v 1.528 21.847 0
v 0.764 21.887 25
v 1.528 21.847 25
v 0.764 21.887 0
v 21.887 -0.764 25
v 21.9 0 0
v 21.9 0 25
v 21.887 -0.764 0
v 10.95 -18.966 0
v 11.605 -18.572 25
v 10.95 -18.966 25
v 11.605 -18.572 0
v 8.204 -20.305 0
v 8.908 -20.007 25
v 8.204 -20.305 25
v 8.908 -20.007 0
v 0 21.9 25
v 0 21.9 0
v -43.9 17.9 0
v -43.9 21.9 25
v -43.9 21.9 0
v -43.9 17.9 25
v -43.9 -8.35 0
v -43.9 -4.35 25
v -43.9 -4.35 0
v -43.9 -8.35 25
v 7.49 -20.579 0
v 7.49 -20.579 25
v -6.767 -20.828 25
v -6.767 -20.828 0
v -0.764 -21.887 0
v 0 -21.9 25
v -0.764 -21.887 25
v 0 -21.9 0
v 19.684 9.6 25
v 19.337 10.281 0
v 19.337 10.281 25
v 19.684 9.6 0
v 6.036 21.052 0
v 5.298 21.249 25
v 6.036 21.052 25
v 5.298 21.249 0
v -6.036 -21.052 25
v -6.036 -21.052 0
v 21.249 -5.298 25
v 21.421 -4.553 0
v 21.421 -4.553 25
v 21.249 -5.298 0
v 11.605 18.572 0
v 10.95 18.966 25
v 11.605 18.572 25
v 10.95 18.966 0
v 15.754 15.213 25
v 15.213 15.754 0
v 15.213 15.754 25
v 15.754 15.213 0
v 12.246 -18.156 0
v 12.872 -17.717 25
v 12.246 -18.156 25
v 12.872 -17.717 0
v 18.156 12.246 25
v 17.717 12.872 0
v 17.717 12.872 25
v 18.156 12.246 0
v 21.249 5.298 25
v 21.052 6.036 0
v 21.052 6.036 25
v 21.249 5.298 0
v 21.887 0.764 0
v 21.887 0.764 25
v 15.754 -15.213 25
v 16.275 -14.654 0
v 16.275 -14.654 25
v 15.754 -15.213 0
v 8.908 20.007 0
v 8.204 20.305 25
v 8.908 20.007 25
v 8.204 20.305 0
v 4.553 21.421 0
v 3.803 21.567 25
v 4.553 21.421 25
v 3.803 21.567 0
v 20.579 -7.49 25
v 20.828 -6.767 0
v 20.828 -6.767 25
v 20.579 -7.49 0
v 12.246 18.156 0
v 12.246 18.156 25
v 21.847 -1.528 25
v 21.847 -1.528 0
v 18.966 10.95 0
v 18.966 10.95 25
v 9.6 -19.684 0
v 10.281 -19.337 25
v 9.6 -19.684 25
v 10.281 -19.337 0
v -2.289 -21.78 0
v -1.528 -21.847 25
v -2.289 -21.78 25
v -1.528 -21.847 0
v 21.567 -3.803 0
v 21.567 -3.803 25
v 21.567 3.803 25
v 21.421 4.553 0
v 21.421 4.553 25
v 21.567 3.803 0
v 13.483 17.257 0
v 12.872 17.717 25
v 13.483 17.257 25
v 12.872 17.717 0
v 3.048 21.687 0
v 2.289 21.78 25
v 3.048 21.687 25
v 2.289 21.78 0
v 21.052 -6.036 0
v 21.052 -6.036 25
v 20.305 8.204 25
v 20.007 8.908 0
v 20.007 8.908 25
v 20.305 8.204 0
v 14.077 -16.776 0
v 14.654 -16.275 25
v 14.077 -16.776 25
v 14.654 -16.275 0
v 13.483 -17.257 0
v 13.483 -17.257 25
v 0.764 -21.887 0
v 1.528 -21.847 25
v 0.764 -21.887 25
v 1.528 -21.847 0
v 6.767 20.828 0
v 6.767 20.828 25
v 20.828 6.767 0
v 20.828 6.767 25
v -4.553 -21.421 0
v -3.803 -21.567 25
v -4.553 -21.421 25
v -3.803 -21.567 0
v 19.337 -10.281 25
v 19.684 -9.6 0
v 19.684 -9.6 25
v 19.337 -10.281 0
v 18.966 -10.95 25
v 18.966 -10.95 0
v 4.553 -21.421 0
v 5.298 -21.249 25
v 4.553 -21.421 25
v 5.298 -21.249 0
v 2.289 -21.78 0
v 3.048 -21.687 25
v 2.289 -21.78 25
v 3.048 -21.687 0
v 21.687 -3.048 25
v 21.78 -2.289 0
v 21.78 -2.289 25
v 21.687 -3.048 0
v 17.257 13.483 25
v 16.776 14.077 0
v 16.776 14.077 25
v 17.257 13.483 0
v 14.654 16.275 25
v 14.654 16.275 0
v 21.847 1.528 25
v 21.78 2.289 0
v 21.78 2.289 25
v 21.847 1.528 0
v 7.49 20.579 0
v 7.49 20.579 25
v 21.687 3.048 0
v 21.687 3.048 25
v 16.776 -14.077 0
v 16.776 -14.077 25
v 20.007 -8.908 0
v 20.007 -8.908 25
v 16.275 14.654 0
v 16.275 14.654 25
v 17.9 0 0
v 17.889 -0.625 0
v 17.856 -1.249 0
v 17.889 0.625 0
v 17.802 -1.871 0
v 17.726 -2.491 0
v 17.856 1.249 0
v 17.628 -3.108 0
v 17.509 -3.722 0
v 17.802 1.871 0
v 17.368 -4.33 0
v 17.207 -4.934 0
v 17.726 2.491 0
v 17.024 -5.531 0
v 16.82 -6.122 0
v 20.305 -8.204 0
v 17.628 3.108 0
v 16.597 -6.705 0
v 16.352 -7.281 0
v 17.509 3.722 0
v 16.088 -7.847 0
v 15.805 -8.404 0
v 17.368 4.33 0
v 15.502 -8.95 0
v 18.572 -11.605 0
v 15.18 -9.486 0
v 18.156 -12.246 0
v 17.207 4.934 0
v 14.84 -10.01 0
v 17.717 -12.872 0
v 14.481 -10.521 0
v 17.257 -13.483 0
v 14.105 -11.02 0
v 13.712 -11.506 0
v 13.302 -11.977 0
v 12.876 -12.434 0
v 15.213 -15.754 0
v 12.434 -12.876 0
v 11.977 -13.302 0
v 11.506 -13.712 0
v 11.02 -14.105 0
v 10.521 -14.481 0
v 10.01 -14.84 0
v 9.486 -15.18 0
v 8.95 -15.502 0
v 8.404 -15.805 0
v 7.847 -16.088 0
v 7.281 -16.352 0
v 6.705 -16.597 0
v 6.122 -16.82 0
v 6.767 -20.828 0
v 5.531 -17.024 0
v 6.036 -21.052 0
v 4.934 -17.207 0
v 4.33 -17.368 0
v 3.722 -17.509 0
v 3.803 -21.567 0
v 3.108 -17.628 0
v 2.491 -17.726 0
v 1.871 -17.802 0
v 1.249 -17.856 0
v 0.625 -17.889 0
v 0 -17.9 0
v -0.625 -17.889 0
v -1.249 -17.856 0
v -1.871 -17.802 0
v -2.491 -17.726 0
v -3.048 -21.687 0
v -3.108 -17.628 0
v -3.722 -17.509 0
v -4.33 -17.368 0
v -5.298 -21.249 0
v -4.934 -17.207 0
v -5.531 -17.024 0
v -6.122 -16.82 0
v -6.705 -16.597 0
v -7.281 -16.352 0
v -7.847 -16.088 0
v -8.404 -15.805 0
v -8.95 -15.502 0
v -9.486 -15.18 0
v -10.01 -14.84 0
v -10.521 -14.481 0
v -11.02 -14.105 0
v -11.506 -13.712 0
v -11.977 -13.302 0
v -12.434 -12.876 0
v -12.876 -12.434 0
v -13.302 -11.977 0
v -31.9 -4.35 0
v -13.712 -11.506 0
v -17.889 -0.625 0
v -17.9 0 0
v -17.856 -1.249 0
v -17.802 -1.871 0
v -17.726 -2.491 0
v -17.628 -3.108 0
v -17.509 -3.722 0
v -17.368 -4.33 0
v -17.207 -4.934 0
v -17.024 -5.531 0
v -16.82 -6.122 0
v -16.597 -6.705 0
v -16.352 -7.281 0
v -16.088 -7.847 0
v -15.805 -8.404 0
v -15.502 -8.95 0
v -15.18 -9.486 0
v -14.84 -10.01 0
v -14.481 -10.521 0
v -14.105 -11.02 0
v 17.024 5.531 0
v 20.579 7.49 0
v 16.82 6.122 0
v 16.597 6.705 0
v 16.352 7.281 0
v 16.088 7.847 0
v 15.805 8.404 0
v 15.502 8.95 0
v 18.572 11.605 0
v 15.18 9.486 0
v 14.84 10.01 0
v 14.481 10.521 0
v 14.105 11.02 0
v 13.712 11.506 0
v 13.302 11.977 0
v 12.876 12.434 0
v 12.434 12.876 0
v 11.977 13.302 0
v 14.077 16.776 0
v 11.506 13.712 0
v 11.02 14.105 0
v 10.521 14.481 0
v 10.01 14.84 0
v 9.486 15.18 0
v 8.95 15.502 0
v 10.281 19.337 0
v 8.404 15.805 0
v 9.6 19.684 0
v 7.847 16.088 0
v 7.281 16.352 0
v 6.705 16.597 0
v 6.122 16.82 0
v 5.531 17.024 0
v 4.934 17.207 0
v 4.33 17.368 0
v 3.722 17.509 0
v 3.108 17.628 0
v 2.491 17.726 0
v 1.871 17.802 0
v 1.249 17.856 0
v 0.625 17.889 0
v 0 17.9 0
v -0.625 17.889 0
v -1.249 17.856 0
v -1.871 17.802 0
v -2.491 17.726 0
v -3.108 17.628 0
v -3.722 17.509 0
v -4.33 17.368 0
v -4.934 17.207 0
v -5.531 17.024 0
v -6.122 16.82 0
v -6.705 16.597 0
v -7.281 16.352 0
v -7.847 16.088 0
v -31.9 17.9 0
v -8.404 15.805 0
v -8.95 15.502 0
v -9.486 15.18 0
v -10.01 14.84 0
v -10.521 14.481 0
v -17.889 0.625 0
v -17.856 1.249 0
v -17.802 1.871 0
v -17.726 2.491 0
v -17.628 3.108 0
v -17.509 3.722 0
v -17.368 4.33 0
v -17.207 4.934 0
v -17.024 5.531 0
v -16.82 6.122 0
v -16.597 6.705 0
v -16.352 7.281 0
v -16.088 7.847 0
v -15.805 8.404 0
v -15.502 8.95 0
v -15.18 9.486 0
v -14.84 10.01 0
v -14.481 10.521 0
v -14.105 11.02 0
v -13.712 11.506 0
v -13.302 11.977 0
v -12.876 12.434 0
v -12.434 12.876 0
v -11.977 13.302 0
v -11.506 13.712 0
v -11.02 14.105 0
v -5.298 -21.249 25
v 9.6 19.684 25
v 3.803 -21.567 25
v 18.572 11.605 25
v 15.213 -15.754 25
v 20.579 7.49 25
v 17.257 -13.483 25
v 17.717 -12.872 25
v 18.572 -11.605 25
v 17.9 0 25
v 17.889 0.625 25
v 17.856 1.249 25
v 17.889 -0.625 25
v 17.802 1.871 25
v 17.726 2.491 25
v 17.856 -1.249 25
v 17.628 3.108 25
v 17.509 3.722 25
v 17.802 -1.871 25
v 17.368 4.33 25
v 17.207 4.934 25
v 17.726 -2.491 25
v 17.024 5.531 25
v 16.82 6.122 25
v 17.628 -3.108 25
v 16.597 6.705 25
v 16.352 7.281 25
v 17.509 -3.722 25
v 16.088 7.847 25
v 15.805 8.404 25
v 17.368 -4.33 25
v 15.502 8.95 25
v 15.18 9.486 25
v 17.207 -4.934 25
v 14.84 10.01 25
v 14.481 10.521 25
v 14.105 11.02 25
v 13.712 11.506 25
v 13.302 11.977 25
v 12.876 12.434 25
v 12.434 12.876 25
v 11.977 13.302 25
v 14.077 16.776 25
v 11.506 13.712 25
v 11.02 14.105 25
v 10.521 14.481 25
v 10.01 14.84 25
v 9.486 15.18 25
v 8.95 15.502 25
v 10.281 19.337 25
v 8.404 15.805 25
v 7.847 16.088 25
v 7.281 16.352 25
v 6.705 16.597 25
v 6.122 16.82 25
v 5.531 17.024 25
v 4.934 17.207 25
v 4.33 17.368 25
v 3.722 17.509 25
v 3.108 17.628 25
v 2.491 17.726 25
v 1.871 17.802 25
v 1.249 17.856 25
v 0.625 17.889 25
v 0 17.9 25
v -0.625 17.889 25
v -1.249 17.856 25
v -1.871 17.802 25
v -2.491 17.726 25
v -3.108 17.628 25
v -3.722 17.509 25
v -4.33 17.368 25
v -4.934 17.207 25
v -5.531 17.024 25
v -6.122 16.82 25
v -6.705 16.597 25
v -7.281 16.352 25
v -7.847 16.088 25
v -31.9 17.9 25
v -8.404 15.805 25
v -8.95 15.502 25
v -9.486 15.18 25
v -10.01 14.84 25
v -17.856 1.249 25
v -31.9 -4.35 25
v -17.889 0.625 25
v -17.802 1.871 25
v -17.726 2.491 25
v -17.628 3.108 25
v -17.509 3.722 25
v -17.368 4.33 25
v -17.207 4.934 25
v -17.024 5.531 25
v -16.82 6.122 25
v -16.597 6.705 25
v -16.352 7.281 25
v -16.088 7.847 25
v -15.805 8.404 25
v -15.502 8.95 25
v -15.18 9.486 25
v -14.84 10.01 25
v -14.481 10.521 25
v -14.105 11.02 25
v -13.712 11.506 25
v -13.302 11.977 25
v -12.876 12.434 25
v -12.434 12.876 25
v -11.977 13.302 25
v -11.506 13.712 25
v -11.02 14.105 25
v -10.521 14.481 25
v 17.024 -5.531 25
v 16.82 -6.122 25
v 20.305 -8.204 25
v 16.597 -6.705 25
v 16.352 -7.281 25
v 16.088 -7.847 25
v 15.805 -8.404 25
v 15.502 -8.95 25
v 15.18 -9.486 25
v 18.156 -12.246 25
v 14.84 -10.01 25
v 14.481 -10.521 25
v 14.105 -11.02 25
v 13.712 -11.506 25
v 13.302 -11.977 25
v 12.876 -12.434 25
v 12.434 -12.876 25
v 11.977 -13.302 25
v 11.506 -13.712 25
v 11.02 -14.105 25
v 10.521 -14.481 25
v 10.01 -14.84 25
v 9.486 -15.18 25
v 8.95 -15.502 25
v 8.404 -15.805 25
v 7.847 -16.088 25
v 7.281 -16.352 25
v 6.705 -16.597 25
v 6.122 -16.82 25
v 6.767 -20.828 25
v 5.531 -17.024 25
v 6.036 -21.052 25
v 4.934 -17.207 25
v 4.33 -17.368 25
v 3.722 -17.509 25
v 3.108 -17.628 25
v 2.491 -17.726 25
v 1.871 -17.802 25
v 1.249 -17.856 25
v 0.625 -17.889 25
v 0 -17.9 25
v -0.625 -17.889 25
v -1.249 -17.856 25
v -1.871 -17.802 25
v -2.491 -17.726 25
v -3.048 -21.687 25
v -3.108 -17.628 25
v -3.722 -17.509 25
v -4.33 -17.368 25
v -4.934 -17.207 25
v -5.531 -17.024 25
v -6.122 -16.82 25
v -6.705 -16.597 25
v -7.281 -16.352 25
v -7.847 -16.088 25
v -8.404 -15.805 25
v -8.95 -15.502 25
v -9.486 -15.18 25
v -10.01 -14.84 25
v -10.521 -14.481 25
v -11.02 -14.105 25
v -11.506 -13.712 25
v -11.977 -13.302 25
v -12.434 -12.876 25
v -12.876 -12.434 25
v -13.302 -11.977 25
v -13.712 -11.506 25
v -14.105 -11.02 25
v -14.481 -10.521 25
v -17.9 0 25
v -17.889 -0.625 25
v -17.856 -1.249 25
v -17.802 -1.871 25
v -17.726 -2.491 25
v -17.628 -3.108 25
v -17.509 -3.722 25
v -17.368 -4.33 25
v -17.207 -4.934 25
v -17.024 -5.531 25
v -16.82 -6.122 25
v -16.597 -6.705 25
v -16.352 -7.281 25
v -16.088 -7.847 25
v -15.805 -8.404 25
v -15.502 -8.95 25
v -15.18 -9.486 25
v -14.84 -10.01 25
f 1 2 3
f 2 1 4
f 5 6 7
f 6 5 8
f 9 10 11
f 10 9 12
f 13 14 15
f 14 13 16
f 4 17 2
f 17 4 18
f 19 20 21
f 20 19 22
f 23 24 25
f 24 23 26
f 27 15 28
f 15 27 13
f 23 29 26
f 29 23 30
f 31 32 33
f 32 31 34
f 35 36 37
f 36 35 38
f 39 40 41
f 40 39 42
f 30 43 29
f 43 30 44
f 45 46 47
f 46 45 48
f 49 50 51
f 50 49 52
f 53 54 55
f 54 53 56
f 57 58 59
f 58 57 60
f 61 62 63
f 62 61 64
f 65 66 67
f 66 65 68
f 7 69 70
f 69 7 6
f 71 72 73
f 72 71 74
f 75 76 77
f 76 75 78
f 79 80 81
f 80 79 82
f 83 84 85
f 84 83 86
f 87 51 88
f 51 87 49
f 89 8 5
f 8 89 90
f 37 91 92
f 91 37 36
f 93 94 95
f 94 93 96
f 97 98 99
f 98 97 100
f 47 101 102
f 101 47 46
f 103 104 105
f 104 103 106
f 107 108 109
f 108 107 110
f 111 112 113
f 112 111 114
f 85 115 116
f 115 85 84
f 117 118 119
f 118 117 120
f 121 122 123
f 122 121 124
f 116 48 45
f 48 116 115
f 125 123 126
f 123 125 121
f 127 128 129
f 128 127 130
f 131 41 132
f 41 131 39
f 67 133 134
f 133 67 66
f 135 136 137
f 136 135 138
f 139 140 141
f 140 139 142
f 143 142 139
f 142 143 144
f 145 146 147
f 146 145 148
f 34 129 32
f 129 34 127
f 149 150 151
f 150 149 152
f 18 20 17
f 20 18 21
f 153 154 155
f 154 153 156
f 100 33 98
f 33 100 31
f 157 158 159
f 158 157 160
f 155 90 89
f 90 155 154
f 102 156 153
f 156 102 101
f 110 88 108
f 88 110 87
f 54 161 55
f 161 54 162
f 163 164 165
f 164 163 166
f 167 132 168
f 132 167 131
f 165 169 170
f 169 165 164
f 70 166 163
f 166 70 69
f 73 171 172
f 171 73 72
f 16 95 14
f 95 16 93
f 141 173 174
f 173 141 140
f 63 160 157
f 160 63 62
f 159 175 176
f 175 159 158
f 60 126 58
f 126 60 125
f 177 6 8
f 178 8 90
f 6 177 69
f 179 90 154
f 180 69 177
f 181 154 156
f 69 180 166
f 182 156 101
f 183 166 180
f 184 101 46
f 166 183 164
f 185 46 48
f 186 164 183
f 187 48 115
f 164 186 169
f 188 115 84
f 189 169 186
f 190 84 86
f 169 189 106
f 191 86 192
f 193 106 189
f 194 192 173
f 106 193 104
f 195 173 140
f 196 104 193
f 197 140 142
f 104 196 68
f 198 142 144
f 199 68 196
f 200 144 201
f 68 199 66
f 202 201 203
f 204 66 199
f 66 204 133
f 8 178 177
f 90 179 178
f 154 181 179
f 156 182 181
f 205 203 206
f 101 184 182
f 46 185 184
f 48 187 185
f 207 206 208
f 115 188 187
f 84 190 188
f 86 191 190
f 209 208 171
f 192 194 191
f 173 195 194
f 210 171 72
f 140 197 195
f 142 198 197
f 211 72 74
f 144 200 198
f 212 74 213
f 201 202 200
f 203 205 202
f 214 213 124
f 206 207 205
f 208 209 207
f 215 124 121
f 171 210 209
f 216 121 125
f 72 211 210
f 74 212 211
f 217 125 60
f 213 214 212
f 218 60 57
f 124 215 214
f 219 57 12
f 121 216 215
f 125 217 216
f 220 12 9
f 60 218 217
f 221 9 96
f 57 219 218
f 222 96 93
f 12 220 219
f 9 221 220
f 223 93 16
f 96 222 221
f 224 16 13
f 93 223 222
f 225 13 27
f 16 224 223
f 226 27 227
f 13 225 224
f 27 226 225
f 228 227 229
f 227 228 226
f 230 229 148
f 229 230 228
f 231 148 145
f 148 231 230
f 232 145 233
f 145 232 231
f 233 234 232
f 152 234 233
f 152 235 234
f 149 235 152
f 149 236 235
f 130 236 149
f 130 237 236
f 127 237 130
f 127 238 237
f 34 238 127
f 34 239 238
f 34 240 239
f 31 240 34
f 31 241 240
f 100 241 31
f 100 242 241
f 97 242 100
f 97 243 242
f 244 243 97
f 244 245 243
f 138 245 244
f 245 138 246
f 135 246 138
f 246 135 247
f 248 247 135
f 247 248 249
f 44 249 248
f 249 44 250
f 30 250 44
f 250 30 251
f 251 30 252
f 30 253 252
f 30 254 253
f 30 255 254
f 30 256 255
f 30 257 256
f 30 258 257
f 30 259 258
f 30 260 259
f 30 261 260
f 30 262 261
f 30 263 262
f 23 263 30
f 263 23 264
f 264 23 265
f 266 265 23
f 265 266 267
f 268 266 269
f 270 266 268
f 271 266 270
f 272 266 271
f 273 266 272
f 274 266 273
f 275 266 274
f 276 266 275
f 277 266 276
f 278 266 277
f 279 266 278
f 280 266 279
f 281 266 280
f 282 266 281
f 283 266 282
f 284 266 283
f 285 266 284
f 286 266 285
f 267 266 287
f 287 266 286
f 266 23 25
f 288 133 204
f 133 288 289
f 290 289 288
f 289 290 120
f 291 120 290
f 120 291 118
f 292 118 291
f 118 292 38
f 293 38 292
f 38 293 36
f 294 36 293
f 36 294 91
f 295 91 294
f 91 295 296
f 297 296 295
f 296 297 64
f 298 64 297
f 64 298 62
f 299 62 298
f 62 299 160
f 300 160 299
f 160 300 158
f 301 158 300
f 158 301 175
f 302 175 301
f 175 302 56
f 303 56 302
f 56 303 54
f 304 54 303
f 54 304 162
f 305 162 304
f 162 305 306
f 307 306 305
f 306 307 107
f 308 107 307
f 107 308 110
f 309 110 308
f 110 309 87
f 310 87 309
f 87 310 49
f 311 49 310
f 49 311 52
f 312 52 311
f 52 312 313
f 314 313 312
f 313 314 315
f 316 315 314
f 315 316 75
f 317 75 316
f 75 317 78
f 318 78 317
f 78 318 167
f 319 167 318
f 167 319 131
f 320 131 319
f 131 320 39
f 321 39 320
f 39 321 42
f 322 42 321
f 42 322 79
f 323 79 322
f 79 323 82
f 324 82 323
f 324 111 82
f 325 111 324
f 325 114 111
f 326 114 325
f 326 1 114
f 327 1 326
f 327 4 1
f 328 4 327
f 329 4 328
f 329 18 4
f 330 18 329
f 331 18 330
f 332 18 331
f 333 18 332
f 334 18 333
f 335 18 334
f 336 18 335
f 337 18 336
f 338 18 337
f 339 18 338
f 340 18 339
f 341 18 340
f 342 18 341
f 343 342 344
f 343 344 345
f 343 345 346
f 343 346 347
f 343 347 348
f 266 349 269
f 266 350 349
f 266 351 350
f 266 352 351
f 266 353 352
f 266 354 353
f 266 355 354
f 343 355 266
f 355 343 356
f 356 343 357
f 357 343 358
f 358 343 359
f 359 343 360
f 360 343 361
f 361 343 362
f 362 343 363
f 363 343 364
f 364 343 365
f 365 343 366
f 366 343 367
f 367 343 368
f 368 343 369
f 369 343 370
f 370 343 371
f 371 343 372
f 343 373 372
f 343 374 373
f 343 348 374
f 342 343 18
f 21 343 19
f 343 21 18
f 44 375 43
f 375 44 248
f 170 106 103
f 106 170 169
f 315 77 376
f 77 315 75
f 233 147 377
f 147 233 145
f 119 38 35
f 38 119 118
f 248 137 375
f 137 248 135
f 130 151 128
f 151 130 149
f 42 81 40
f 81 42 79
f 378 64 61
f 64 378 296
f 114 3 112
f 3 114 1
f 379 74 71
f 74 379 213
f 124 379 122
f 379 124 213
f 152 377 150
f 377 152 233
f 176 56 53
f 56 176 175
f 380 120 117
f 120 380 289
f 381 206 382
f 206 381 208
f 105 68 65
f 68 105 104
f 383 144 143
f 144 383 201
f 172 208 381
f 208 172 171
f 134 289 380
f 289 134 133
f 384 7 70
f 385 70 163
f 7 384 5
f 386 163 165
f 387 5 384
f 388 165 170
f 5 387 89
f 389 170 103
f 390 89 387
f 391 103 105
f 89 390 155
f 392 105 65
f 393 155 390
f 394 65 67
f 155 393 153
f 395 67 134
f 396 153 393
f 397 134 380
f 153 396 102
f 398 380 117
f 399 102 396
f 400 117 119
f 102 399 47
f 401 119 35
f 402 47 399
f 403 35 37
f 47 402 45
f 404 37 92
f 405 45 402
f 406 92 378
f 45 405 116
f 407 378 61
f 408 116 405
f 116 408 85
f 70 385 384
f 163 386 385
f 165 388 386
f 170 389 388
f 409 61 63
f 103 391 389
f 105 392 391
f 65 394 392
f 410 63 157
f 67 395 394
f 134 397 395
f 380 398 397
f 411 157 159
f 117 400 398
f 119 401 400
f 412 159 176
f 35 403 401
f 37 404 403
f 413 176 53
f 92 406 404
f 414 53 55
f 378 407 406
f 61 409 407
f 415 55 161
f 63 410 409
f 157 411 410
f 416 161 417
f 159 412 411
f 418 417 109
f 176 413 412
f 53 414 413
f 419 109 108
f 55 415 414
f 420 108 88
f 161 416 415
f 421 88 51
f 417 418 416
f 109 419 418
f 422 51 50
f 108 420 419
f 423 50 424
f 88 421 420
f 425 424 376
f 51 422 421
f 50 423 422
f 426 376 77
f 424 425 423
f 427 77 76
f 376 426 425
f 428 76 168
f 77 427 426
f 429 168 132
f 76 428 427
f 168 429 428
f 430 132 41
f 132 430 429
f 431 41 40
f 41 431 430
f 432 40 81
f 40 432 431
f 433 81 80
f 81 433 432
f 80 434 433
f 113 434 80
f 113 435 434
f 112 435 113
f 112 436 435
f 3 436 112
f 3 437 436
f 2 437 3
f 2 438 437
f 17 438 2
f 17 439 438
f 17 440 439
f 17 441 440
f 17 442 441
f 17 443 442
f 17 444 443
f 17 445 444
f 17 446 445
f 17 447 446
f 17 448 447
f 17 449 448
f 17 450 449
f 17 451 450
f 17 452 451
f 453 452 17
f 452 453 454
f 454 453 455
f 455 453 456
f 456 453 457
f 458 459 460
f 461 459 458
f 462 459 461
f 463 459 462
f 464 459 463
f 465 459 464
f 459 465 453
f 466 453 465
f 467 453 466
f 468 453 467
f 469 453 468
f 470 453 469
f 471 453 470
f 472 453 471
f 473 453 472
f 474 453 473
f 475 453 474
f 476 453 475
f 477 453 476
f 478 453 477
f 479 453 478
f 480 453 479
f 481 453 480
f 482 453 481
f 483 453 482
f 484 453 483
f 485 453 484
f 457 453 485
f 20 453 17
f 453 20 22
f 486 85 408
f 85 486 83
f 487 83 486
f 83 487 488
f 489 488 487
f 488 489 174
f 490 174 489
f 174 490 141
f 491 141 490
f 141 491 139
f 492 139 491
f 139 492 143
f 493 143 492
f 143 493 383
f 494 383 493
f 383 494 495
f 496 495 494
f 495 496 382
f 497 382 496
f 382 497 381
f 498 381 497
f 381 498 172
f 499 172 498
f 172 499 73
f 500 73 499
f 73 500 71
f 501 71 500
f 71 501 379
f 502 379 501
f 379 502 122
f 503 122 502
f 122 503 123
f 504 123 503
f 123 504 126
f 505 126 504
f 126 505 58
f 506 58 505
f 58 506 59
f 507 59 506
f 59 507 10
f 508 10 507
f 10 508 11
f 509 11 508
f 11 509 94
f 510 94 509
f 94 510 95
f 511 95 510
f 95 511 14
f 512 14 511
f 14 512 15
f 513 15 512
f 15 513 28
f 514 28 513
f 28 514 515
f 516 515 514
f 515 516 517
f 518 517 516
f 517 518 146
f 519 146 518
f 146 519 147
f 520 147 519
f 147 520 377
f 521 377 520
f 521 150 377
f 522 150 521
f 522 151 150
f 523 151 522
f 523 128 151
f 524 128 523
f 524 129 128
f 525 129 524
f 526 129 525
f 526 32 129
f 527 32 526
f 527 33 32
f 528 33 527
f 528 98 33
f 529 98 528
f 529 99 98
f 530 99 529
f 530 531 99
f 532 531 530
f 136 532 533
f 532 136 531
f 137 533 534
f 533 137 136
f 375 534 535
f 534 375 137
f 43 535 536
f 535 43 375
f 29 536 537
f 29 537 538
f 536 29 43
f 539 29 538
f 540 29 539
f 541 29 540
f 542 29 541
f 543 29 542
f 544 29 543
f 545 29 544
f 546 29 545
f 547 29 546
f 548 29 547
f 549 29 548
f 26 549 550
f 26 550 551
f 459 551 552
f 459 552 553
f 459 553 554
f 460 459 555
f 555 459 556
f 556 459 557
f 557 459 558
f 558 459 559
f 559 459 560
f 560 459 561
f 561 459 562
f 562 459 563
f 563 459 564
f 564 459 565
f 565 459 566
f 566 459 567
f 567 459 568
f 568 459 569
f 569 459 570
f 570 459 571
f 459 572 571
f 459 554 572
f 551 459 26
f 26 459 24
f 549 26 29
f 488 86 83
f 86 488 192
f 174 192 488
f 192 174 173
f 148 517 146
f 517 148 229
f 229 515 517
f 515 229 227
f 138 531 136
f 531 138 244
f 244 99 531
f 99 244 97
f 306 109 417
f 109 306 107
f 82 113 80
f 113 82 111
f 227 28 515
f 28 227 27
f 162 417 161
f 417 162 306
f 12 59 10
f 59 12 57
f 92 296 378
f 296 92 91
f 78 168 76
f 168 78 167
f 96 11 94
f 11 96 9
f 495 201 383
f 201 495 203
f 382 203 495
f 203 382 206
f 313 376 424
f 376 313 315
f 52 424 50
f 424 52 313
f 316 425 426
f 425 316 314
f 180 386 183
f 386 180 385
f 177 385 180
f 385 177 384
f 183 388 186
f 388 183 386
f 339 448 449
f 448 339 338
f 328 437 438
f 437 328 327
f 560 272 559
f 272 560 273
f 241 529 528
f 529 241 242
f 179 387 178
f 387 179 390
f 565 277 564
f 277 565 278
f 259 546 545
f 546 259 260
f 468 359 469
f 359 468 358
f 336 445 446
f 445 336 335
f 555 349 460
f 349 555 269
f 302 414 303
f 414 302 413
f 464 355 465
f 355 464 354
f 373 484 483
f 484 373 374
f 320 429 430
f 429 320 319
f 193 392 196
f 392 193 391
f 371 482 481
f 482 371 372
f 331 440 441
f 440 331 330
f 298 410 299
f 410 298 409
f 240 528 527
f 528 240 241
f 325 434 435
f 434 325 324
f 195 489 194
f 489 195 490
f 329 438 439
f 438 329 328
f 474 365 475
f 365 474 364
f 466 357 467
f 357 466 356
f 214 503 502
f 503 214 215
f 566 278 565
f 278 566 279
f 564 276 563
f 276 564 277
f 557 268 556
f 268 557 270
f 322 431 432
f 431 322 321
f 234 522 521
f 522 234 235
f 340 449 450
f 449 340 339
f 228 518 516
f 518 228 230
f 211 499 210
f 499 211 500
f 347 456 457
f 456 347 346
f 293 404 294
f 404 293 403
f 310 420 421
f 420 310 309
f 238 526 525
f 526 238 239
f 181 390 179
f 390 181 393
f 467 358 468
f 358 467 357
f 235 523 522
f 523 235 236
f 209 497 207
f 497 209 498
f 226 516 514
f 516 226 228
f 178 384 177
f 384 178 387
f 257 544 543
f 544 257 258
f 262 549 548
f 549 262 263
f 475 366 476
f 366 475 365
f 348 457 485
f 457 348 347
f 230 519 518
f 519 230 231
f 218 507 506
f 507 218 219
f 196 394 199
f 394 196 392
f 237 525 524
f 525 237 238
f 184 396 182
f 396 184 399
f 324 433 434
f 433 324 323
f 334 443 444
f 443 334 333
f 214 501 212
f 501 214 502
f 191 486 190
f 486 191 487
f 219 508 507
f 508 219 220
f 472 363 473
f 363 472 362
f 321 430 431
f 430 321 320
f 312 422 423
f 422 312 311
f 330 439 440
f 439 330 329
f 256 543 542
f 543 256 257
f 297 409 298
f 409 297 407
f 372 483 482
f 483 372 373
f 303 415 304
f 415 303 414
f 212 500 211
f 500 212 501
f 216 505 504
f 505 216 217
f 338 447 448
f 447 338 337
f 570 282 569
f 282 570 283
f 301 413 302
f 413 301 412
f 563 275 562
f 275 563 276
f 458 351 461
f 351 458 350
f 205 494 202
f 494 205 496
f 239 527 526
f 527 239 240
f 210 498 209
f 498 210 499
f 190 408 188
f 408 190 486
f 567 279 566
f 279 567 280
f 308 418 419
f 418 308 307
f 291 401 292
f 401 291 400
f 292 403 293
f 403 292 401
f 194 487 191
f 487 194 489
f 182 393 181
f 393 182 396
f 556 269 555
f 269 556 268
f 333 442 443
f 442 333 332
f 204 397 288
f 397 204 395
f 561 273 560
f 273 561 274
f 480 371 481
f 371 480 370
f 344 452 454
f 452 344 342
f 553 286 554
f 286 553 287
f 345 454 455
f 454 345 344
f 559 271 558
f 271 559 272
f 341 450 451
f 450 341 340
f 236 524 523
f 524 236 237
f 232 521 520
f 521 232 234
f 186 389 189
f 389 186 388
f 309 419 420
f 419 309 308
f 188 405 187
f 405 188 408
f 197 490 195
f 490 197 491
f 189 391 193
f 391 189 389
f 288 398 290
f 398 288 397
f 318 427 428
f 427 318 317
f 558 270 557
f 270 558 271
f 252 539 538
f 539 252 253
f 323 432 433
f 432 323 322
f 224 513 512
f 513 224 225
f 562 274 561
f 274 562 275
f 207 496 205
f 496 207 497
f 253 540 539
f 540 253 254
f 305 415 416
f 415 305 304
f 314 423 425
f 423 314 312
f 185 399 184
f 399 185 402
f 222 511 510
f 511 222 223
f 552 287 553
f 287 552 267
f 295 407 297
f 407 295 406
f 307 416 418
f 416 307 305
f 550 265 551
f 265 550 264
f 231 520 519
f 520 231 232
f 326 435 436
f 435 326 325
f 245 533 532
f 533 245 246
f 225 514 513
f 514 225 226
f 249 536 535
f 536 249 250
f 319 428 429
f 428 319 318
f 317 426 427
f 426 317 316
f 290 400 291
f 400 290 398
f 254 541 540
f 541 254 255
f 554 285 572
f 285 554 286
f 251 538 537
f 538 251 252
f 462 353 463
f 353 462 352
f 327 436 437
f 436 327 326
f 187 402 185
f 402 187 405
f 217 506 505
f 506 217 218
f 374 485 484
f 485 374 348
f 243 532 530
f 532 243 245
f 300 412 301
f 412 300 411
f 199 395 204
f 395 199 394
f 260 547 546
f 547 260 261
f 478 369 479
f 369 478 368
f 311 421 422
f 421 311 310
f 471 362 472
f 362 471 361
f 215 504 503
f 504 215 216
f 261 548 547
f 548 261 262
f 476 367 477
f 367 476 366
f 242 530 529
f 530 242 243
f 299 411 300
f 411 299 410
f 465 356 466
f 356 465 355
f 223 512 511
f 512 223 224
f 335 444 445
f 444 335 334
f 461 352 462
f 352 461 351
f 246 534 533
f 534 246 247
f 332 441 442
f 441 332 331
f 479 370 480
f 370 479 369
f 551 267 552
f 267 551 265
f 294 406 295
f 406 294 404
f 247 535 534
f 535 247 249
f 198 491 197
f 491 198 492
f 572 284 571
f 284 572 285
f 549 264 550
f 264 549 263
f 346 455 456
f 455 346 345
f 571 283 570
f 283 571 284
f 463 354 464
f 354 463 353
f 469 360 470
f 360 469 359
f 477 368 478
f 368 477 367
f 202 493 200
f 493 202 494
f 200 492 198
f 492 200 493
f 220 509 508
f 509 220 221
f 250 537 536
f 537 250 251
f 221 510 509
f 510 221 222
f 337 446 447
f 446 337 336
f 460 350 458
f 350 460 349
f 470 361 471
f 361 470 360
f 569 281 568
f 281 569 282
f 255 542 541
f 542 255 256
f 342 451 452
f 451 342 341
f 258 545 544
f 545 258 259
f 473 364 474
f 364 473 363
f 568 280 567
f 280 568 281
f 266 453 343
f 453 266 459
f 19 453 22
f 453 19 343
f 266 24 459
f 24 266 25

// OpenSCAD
// monitor brace for rough seas
curvy = 180;

//TODO
// fits ok. need a little tigher on post to friction fit. 35.75? 35.5 was too tight, maybe 35.6.
//need to rotate monitor clip. frame not parallel to post. 
//also anyway, it doesn't grip it tight enough, montior frame curves at bottom. if higher friction fit might be fine?

post_diameter = 35.8; //35.45
monitor_frame_depth = 22.25; //21.8
//back of monitor aligned with back of post
post_monitor_gap = 10; //12.35

brace_height = 25;
brace_wall_width = 4;
brace_U_depth = 12;

difference(){
    hull(){
        //outer wall brace aroudn post
        cylinder(brace_height, post_diameter/2+brace_wall_width, post_diameter/2+brace_wall_width, $fn=curvy);
        
        //outer monitor part here to create nice hull
        translate([-(post_diameter/2+brace_wall_width)-(post_monitor_gap+brace_U_depth), post_diameter/2-(monitor_frame_depth+brace_wall_width*2)+brace_wall_width, 0]){
            cube([post_monitor_gap+brace_U_depth+0/2,monitor_frame_depth+brace_wall_width*2,brace_height]);
        }
    }
    //subtract post void
    cylinder(brace_height, post_diameter/2, post_diameter/2, $fn=curvy);
    //subtract monitor frame void               
    translate([-(post_diameter/2+brace_wall_width)-(post_monitor_gap+brace_U_depth)-(post_diameter/2+post_monitor_gap), post_diameter/2-(monitor_frame_depth+brace_wall_width*2)+brace_wall_width*2, 0]){
        cube([post_monitor_gap+brace_U_depth+post_diameter/2,monitor_frame_depth,brace_height]);
    }
}
